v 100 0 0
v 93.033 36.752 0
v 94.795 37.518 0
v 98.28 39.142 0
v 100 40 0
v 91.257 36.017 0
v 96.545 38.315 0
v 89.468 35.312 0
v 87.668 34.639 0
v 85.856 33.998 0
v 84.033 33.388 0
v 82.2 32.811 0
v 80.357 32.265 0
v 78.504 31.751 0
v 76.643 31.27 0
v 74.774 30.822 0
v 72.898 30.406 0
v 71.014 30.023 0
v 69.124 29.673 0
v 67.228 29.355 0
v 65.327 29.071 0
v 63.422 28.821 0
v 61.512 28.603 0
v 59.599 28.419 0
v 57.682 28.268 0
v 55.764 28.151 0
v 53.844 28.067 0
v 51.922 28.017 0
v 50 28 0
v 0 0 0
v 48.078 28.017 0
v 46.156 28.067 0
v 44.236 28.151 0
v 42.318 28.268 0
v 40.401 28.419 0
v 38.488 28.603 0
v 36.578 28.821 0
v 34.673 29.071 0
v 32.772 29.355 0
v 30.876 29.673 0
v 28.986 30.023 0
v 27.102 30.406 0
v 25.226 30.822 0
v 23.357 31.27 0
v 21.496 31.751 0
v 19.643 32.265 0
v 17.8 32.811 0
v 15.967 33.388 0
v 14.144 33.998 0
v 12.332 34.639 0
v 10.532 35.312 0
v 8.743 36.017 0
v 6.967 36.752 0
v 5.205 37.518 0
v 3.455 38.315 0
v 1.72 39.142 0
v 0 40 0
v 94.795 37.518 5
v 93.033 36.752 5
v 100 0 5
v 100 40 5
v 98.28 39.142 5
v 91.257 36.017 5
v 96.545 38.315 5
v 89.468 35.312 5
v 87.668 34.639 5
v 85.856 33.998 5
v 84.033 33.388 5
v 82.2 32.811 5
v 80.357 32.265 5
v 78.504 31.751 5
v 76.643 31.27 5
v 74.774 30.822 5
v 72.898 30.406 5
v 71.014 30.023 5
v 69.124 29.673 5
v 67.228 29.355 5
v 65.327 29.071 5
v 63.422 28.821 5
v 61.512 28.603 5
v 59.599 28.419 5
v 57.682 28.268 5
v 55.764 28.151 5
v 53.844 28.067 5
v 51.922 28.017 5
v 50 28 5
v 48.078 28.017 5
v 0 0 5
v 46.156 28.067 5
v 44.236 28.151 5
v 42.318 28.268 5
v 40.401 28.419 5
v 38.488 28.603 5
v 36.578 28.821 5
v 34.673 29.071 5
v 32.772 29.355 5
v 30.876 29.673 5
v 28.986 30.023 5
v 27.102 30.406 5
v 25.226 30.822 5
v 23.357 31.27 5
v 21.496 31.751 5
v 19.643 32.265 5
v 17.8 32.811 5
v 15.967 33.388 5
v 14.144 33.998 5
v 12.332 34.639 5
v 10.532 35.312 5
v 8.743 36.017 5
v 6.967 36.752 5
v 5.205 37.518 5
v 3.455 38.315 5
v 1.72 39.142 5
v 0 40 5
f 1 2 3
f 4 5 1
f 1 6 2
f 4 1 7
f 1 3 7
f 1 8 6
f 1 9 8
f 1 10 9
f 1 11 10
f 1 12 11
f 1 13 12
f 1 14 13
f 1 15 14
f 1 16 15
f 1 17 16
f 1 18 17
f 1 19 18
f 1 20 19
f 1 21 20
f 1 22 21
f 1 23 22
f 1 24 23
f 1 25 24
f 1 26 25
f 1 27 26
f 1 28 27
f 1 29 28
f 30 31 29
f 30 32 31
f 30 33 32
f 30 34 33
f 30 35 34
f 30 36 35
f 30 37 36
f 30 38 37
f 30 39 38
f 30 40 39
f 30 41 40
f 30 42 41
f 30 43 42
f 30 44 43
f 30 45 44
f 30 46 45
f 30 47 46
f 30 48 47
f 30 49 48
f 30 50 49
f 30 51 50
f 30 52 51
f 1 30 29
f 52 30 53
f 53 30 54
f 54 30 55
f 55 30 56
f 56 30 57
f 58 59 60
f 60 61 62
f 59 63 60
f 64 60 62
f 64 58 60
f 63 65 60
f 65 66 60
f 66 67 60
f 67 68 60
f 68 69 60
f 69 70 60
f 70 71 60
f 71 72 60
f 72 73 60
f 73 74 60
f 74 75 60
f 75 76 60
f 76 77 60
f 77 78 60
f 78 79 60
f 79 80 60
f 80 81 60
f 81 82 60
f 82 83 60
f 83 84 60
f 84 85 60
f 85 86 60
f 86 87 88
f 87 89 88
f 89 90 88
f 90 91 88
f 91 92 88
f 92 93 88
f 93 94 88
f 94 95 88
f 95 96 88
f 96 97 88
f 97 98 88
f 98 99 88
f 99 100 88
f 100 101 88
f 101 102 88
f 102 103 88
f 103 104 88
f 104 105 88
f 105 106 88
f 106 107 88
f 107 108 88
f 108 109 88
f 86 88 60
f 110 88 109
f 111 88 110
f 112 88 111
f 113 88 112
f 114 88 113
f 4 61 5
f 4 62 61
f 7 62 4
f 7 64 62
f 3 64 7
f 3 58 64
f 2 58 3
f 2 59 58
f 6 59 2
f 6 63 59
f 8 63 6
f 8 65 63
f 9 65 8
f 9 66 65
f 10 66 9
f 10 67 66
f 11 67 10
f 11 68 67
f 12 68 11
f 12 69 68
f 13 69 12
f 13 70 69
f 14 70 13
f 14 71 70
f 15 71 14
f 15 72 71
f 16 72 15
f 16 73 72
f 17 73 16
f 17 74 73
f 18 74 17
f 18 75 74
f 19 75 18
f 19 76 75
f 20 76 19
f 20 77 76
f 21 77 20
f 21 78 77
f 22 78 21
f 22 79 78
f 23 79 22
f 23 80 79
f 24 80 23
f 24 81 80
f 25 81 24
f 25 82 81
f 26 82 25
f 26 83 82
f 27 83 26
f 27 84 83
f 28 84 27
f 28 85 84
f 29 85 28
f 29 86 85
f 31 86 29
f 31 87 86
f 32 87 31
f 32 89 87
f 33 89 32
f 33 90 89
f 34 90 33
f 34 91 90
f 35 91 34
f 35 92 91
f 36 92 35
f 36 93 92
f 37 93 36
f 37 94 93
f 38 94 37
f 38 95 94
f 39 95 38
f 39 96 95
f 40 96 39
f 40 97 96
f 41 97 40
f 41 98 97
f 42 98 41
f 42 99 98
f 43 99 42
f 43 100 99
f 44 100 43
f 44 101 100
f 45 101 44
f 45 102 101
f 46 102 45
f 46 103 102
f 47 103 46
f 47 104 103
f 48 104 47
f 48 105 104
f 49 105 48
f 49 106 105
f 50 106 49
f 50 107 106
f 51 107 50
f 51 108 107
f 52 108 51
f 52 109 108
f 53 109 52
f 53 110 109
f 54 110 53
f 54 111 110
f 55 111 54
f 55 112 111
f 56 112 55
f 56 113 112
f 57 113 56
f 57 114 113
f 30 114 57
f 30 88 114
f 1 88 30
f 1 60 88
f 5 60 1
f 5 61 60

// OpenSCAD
$fn = 32;

// ----------------------------------------------------------------------
// Arc profile plate: notch, 57 points
// ----------------------------------------------------------------------

// --- parameters (mm) ---
bar_l = 100;              // bar length, X
bar_w = 40;               // bar width, Y
notch_depth = 12;         // depth of the arc notch at mid-span
arc_r = 110.17;           // radius of the notch arc
arc_angle = 53.98;        // notch arc angle, degrees
arc_step = 1;             // sampling step of the notch arc, degrees
plate_t = 5;              // plate thickness, Z

profile = [[0, 0], [100, 0], [100, 40], [98.28, 39.142], [96.545, 38.315], [94.795, 37.518], [93.033, 36.752], [91.257, 36.017], [89.468, 35.312], [87.668, 34.639], [85.856, 33.998], [84.033, 33.388], [82.2, 32.811], [80.357, 32.265], [78.504, 31.751], [76.643, 31.27], [74.774, 30.822], [72.898, 30.406], [71.014, 30.023], [69.124, 29.673], [67.228, 29.355], [65.327, 29.071], [63.422, 28.821], [61.512, 28.603], [59.599, 28.419], [57.682, 28.268], [55.764, 28.151], [53.844, 28.067], [51.922, 28.017], [50, 28], [48.078, 28.017], [46.156, 28.067], [44.236, 28.151], [42.318, 28.268], [40.401, 28.419], [38.488, 28.603], [36.578, 28.821], [34.673, 29.071], [32.772, 29.355], [30.876, 29.673], [28.986, 30.023], [27.102, 30.406], [25.226, 30.822], [23.357, 31.27], [21.496, 31.751], [19.643, 32.265], [17.8, 32.811], [15.967, 33.388], [14.144, 33.998], [12.332, 34.639], [10.532, 35.312], [8.743, 36.017], [6.967, 36.752], [5.205, 37.518], [3.455, 38.315], [1.72, 39.142], [0, 40]];  // primary outline, 57 points, counter clockwise

// --- the one profile operation ---
linear_extrude(height = plate_t) polygon(points = profile);
